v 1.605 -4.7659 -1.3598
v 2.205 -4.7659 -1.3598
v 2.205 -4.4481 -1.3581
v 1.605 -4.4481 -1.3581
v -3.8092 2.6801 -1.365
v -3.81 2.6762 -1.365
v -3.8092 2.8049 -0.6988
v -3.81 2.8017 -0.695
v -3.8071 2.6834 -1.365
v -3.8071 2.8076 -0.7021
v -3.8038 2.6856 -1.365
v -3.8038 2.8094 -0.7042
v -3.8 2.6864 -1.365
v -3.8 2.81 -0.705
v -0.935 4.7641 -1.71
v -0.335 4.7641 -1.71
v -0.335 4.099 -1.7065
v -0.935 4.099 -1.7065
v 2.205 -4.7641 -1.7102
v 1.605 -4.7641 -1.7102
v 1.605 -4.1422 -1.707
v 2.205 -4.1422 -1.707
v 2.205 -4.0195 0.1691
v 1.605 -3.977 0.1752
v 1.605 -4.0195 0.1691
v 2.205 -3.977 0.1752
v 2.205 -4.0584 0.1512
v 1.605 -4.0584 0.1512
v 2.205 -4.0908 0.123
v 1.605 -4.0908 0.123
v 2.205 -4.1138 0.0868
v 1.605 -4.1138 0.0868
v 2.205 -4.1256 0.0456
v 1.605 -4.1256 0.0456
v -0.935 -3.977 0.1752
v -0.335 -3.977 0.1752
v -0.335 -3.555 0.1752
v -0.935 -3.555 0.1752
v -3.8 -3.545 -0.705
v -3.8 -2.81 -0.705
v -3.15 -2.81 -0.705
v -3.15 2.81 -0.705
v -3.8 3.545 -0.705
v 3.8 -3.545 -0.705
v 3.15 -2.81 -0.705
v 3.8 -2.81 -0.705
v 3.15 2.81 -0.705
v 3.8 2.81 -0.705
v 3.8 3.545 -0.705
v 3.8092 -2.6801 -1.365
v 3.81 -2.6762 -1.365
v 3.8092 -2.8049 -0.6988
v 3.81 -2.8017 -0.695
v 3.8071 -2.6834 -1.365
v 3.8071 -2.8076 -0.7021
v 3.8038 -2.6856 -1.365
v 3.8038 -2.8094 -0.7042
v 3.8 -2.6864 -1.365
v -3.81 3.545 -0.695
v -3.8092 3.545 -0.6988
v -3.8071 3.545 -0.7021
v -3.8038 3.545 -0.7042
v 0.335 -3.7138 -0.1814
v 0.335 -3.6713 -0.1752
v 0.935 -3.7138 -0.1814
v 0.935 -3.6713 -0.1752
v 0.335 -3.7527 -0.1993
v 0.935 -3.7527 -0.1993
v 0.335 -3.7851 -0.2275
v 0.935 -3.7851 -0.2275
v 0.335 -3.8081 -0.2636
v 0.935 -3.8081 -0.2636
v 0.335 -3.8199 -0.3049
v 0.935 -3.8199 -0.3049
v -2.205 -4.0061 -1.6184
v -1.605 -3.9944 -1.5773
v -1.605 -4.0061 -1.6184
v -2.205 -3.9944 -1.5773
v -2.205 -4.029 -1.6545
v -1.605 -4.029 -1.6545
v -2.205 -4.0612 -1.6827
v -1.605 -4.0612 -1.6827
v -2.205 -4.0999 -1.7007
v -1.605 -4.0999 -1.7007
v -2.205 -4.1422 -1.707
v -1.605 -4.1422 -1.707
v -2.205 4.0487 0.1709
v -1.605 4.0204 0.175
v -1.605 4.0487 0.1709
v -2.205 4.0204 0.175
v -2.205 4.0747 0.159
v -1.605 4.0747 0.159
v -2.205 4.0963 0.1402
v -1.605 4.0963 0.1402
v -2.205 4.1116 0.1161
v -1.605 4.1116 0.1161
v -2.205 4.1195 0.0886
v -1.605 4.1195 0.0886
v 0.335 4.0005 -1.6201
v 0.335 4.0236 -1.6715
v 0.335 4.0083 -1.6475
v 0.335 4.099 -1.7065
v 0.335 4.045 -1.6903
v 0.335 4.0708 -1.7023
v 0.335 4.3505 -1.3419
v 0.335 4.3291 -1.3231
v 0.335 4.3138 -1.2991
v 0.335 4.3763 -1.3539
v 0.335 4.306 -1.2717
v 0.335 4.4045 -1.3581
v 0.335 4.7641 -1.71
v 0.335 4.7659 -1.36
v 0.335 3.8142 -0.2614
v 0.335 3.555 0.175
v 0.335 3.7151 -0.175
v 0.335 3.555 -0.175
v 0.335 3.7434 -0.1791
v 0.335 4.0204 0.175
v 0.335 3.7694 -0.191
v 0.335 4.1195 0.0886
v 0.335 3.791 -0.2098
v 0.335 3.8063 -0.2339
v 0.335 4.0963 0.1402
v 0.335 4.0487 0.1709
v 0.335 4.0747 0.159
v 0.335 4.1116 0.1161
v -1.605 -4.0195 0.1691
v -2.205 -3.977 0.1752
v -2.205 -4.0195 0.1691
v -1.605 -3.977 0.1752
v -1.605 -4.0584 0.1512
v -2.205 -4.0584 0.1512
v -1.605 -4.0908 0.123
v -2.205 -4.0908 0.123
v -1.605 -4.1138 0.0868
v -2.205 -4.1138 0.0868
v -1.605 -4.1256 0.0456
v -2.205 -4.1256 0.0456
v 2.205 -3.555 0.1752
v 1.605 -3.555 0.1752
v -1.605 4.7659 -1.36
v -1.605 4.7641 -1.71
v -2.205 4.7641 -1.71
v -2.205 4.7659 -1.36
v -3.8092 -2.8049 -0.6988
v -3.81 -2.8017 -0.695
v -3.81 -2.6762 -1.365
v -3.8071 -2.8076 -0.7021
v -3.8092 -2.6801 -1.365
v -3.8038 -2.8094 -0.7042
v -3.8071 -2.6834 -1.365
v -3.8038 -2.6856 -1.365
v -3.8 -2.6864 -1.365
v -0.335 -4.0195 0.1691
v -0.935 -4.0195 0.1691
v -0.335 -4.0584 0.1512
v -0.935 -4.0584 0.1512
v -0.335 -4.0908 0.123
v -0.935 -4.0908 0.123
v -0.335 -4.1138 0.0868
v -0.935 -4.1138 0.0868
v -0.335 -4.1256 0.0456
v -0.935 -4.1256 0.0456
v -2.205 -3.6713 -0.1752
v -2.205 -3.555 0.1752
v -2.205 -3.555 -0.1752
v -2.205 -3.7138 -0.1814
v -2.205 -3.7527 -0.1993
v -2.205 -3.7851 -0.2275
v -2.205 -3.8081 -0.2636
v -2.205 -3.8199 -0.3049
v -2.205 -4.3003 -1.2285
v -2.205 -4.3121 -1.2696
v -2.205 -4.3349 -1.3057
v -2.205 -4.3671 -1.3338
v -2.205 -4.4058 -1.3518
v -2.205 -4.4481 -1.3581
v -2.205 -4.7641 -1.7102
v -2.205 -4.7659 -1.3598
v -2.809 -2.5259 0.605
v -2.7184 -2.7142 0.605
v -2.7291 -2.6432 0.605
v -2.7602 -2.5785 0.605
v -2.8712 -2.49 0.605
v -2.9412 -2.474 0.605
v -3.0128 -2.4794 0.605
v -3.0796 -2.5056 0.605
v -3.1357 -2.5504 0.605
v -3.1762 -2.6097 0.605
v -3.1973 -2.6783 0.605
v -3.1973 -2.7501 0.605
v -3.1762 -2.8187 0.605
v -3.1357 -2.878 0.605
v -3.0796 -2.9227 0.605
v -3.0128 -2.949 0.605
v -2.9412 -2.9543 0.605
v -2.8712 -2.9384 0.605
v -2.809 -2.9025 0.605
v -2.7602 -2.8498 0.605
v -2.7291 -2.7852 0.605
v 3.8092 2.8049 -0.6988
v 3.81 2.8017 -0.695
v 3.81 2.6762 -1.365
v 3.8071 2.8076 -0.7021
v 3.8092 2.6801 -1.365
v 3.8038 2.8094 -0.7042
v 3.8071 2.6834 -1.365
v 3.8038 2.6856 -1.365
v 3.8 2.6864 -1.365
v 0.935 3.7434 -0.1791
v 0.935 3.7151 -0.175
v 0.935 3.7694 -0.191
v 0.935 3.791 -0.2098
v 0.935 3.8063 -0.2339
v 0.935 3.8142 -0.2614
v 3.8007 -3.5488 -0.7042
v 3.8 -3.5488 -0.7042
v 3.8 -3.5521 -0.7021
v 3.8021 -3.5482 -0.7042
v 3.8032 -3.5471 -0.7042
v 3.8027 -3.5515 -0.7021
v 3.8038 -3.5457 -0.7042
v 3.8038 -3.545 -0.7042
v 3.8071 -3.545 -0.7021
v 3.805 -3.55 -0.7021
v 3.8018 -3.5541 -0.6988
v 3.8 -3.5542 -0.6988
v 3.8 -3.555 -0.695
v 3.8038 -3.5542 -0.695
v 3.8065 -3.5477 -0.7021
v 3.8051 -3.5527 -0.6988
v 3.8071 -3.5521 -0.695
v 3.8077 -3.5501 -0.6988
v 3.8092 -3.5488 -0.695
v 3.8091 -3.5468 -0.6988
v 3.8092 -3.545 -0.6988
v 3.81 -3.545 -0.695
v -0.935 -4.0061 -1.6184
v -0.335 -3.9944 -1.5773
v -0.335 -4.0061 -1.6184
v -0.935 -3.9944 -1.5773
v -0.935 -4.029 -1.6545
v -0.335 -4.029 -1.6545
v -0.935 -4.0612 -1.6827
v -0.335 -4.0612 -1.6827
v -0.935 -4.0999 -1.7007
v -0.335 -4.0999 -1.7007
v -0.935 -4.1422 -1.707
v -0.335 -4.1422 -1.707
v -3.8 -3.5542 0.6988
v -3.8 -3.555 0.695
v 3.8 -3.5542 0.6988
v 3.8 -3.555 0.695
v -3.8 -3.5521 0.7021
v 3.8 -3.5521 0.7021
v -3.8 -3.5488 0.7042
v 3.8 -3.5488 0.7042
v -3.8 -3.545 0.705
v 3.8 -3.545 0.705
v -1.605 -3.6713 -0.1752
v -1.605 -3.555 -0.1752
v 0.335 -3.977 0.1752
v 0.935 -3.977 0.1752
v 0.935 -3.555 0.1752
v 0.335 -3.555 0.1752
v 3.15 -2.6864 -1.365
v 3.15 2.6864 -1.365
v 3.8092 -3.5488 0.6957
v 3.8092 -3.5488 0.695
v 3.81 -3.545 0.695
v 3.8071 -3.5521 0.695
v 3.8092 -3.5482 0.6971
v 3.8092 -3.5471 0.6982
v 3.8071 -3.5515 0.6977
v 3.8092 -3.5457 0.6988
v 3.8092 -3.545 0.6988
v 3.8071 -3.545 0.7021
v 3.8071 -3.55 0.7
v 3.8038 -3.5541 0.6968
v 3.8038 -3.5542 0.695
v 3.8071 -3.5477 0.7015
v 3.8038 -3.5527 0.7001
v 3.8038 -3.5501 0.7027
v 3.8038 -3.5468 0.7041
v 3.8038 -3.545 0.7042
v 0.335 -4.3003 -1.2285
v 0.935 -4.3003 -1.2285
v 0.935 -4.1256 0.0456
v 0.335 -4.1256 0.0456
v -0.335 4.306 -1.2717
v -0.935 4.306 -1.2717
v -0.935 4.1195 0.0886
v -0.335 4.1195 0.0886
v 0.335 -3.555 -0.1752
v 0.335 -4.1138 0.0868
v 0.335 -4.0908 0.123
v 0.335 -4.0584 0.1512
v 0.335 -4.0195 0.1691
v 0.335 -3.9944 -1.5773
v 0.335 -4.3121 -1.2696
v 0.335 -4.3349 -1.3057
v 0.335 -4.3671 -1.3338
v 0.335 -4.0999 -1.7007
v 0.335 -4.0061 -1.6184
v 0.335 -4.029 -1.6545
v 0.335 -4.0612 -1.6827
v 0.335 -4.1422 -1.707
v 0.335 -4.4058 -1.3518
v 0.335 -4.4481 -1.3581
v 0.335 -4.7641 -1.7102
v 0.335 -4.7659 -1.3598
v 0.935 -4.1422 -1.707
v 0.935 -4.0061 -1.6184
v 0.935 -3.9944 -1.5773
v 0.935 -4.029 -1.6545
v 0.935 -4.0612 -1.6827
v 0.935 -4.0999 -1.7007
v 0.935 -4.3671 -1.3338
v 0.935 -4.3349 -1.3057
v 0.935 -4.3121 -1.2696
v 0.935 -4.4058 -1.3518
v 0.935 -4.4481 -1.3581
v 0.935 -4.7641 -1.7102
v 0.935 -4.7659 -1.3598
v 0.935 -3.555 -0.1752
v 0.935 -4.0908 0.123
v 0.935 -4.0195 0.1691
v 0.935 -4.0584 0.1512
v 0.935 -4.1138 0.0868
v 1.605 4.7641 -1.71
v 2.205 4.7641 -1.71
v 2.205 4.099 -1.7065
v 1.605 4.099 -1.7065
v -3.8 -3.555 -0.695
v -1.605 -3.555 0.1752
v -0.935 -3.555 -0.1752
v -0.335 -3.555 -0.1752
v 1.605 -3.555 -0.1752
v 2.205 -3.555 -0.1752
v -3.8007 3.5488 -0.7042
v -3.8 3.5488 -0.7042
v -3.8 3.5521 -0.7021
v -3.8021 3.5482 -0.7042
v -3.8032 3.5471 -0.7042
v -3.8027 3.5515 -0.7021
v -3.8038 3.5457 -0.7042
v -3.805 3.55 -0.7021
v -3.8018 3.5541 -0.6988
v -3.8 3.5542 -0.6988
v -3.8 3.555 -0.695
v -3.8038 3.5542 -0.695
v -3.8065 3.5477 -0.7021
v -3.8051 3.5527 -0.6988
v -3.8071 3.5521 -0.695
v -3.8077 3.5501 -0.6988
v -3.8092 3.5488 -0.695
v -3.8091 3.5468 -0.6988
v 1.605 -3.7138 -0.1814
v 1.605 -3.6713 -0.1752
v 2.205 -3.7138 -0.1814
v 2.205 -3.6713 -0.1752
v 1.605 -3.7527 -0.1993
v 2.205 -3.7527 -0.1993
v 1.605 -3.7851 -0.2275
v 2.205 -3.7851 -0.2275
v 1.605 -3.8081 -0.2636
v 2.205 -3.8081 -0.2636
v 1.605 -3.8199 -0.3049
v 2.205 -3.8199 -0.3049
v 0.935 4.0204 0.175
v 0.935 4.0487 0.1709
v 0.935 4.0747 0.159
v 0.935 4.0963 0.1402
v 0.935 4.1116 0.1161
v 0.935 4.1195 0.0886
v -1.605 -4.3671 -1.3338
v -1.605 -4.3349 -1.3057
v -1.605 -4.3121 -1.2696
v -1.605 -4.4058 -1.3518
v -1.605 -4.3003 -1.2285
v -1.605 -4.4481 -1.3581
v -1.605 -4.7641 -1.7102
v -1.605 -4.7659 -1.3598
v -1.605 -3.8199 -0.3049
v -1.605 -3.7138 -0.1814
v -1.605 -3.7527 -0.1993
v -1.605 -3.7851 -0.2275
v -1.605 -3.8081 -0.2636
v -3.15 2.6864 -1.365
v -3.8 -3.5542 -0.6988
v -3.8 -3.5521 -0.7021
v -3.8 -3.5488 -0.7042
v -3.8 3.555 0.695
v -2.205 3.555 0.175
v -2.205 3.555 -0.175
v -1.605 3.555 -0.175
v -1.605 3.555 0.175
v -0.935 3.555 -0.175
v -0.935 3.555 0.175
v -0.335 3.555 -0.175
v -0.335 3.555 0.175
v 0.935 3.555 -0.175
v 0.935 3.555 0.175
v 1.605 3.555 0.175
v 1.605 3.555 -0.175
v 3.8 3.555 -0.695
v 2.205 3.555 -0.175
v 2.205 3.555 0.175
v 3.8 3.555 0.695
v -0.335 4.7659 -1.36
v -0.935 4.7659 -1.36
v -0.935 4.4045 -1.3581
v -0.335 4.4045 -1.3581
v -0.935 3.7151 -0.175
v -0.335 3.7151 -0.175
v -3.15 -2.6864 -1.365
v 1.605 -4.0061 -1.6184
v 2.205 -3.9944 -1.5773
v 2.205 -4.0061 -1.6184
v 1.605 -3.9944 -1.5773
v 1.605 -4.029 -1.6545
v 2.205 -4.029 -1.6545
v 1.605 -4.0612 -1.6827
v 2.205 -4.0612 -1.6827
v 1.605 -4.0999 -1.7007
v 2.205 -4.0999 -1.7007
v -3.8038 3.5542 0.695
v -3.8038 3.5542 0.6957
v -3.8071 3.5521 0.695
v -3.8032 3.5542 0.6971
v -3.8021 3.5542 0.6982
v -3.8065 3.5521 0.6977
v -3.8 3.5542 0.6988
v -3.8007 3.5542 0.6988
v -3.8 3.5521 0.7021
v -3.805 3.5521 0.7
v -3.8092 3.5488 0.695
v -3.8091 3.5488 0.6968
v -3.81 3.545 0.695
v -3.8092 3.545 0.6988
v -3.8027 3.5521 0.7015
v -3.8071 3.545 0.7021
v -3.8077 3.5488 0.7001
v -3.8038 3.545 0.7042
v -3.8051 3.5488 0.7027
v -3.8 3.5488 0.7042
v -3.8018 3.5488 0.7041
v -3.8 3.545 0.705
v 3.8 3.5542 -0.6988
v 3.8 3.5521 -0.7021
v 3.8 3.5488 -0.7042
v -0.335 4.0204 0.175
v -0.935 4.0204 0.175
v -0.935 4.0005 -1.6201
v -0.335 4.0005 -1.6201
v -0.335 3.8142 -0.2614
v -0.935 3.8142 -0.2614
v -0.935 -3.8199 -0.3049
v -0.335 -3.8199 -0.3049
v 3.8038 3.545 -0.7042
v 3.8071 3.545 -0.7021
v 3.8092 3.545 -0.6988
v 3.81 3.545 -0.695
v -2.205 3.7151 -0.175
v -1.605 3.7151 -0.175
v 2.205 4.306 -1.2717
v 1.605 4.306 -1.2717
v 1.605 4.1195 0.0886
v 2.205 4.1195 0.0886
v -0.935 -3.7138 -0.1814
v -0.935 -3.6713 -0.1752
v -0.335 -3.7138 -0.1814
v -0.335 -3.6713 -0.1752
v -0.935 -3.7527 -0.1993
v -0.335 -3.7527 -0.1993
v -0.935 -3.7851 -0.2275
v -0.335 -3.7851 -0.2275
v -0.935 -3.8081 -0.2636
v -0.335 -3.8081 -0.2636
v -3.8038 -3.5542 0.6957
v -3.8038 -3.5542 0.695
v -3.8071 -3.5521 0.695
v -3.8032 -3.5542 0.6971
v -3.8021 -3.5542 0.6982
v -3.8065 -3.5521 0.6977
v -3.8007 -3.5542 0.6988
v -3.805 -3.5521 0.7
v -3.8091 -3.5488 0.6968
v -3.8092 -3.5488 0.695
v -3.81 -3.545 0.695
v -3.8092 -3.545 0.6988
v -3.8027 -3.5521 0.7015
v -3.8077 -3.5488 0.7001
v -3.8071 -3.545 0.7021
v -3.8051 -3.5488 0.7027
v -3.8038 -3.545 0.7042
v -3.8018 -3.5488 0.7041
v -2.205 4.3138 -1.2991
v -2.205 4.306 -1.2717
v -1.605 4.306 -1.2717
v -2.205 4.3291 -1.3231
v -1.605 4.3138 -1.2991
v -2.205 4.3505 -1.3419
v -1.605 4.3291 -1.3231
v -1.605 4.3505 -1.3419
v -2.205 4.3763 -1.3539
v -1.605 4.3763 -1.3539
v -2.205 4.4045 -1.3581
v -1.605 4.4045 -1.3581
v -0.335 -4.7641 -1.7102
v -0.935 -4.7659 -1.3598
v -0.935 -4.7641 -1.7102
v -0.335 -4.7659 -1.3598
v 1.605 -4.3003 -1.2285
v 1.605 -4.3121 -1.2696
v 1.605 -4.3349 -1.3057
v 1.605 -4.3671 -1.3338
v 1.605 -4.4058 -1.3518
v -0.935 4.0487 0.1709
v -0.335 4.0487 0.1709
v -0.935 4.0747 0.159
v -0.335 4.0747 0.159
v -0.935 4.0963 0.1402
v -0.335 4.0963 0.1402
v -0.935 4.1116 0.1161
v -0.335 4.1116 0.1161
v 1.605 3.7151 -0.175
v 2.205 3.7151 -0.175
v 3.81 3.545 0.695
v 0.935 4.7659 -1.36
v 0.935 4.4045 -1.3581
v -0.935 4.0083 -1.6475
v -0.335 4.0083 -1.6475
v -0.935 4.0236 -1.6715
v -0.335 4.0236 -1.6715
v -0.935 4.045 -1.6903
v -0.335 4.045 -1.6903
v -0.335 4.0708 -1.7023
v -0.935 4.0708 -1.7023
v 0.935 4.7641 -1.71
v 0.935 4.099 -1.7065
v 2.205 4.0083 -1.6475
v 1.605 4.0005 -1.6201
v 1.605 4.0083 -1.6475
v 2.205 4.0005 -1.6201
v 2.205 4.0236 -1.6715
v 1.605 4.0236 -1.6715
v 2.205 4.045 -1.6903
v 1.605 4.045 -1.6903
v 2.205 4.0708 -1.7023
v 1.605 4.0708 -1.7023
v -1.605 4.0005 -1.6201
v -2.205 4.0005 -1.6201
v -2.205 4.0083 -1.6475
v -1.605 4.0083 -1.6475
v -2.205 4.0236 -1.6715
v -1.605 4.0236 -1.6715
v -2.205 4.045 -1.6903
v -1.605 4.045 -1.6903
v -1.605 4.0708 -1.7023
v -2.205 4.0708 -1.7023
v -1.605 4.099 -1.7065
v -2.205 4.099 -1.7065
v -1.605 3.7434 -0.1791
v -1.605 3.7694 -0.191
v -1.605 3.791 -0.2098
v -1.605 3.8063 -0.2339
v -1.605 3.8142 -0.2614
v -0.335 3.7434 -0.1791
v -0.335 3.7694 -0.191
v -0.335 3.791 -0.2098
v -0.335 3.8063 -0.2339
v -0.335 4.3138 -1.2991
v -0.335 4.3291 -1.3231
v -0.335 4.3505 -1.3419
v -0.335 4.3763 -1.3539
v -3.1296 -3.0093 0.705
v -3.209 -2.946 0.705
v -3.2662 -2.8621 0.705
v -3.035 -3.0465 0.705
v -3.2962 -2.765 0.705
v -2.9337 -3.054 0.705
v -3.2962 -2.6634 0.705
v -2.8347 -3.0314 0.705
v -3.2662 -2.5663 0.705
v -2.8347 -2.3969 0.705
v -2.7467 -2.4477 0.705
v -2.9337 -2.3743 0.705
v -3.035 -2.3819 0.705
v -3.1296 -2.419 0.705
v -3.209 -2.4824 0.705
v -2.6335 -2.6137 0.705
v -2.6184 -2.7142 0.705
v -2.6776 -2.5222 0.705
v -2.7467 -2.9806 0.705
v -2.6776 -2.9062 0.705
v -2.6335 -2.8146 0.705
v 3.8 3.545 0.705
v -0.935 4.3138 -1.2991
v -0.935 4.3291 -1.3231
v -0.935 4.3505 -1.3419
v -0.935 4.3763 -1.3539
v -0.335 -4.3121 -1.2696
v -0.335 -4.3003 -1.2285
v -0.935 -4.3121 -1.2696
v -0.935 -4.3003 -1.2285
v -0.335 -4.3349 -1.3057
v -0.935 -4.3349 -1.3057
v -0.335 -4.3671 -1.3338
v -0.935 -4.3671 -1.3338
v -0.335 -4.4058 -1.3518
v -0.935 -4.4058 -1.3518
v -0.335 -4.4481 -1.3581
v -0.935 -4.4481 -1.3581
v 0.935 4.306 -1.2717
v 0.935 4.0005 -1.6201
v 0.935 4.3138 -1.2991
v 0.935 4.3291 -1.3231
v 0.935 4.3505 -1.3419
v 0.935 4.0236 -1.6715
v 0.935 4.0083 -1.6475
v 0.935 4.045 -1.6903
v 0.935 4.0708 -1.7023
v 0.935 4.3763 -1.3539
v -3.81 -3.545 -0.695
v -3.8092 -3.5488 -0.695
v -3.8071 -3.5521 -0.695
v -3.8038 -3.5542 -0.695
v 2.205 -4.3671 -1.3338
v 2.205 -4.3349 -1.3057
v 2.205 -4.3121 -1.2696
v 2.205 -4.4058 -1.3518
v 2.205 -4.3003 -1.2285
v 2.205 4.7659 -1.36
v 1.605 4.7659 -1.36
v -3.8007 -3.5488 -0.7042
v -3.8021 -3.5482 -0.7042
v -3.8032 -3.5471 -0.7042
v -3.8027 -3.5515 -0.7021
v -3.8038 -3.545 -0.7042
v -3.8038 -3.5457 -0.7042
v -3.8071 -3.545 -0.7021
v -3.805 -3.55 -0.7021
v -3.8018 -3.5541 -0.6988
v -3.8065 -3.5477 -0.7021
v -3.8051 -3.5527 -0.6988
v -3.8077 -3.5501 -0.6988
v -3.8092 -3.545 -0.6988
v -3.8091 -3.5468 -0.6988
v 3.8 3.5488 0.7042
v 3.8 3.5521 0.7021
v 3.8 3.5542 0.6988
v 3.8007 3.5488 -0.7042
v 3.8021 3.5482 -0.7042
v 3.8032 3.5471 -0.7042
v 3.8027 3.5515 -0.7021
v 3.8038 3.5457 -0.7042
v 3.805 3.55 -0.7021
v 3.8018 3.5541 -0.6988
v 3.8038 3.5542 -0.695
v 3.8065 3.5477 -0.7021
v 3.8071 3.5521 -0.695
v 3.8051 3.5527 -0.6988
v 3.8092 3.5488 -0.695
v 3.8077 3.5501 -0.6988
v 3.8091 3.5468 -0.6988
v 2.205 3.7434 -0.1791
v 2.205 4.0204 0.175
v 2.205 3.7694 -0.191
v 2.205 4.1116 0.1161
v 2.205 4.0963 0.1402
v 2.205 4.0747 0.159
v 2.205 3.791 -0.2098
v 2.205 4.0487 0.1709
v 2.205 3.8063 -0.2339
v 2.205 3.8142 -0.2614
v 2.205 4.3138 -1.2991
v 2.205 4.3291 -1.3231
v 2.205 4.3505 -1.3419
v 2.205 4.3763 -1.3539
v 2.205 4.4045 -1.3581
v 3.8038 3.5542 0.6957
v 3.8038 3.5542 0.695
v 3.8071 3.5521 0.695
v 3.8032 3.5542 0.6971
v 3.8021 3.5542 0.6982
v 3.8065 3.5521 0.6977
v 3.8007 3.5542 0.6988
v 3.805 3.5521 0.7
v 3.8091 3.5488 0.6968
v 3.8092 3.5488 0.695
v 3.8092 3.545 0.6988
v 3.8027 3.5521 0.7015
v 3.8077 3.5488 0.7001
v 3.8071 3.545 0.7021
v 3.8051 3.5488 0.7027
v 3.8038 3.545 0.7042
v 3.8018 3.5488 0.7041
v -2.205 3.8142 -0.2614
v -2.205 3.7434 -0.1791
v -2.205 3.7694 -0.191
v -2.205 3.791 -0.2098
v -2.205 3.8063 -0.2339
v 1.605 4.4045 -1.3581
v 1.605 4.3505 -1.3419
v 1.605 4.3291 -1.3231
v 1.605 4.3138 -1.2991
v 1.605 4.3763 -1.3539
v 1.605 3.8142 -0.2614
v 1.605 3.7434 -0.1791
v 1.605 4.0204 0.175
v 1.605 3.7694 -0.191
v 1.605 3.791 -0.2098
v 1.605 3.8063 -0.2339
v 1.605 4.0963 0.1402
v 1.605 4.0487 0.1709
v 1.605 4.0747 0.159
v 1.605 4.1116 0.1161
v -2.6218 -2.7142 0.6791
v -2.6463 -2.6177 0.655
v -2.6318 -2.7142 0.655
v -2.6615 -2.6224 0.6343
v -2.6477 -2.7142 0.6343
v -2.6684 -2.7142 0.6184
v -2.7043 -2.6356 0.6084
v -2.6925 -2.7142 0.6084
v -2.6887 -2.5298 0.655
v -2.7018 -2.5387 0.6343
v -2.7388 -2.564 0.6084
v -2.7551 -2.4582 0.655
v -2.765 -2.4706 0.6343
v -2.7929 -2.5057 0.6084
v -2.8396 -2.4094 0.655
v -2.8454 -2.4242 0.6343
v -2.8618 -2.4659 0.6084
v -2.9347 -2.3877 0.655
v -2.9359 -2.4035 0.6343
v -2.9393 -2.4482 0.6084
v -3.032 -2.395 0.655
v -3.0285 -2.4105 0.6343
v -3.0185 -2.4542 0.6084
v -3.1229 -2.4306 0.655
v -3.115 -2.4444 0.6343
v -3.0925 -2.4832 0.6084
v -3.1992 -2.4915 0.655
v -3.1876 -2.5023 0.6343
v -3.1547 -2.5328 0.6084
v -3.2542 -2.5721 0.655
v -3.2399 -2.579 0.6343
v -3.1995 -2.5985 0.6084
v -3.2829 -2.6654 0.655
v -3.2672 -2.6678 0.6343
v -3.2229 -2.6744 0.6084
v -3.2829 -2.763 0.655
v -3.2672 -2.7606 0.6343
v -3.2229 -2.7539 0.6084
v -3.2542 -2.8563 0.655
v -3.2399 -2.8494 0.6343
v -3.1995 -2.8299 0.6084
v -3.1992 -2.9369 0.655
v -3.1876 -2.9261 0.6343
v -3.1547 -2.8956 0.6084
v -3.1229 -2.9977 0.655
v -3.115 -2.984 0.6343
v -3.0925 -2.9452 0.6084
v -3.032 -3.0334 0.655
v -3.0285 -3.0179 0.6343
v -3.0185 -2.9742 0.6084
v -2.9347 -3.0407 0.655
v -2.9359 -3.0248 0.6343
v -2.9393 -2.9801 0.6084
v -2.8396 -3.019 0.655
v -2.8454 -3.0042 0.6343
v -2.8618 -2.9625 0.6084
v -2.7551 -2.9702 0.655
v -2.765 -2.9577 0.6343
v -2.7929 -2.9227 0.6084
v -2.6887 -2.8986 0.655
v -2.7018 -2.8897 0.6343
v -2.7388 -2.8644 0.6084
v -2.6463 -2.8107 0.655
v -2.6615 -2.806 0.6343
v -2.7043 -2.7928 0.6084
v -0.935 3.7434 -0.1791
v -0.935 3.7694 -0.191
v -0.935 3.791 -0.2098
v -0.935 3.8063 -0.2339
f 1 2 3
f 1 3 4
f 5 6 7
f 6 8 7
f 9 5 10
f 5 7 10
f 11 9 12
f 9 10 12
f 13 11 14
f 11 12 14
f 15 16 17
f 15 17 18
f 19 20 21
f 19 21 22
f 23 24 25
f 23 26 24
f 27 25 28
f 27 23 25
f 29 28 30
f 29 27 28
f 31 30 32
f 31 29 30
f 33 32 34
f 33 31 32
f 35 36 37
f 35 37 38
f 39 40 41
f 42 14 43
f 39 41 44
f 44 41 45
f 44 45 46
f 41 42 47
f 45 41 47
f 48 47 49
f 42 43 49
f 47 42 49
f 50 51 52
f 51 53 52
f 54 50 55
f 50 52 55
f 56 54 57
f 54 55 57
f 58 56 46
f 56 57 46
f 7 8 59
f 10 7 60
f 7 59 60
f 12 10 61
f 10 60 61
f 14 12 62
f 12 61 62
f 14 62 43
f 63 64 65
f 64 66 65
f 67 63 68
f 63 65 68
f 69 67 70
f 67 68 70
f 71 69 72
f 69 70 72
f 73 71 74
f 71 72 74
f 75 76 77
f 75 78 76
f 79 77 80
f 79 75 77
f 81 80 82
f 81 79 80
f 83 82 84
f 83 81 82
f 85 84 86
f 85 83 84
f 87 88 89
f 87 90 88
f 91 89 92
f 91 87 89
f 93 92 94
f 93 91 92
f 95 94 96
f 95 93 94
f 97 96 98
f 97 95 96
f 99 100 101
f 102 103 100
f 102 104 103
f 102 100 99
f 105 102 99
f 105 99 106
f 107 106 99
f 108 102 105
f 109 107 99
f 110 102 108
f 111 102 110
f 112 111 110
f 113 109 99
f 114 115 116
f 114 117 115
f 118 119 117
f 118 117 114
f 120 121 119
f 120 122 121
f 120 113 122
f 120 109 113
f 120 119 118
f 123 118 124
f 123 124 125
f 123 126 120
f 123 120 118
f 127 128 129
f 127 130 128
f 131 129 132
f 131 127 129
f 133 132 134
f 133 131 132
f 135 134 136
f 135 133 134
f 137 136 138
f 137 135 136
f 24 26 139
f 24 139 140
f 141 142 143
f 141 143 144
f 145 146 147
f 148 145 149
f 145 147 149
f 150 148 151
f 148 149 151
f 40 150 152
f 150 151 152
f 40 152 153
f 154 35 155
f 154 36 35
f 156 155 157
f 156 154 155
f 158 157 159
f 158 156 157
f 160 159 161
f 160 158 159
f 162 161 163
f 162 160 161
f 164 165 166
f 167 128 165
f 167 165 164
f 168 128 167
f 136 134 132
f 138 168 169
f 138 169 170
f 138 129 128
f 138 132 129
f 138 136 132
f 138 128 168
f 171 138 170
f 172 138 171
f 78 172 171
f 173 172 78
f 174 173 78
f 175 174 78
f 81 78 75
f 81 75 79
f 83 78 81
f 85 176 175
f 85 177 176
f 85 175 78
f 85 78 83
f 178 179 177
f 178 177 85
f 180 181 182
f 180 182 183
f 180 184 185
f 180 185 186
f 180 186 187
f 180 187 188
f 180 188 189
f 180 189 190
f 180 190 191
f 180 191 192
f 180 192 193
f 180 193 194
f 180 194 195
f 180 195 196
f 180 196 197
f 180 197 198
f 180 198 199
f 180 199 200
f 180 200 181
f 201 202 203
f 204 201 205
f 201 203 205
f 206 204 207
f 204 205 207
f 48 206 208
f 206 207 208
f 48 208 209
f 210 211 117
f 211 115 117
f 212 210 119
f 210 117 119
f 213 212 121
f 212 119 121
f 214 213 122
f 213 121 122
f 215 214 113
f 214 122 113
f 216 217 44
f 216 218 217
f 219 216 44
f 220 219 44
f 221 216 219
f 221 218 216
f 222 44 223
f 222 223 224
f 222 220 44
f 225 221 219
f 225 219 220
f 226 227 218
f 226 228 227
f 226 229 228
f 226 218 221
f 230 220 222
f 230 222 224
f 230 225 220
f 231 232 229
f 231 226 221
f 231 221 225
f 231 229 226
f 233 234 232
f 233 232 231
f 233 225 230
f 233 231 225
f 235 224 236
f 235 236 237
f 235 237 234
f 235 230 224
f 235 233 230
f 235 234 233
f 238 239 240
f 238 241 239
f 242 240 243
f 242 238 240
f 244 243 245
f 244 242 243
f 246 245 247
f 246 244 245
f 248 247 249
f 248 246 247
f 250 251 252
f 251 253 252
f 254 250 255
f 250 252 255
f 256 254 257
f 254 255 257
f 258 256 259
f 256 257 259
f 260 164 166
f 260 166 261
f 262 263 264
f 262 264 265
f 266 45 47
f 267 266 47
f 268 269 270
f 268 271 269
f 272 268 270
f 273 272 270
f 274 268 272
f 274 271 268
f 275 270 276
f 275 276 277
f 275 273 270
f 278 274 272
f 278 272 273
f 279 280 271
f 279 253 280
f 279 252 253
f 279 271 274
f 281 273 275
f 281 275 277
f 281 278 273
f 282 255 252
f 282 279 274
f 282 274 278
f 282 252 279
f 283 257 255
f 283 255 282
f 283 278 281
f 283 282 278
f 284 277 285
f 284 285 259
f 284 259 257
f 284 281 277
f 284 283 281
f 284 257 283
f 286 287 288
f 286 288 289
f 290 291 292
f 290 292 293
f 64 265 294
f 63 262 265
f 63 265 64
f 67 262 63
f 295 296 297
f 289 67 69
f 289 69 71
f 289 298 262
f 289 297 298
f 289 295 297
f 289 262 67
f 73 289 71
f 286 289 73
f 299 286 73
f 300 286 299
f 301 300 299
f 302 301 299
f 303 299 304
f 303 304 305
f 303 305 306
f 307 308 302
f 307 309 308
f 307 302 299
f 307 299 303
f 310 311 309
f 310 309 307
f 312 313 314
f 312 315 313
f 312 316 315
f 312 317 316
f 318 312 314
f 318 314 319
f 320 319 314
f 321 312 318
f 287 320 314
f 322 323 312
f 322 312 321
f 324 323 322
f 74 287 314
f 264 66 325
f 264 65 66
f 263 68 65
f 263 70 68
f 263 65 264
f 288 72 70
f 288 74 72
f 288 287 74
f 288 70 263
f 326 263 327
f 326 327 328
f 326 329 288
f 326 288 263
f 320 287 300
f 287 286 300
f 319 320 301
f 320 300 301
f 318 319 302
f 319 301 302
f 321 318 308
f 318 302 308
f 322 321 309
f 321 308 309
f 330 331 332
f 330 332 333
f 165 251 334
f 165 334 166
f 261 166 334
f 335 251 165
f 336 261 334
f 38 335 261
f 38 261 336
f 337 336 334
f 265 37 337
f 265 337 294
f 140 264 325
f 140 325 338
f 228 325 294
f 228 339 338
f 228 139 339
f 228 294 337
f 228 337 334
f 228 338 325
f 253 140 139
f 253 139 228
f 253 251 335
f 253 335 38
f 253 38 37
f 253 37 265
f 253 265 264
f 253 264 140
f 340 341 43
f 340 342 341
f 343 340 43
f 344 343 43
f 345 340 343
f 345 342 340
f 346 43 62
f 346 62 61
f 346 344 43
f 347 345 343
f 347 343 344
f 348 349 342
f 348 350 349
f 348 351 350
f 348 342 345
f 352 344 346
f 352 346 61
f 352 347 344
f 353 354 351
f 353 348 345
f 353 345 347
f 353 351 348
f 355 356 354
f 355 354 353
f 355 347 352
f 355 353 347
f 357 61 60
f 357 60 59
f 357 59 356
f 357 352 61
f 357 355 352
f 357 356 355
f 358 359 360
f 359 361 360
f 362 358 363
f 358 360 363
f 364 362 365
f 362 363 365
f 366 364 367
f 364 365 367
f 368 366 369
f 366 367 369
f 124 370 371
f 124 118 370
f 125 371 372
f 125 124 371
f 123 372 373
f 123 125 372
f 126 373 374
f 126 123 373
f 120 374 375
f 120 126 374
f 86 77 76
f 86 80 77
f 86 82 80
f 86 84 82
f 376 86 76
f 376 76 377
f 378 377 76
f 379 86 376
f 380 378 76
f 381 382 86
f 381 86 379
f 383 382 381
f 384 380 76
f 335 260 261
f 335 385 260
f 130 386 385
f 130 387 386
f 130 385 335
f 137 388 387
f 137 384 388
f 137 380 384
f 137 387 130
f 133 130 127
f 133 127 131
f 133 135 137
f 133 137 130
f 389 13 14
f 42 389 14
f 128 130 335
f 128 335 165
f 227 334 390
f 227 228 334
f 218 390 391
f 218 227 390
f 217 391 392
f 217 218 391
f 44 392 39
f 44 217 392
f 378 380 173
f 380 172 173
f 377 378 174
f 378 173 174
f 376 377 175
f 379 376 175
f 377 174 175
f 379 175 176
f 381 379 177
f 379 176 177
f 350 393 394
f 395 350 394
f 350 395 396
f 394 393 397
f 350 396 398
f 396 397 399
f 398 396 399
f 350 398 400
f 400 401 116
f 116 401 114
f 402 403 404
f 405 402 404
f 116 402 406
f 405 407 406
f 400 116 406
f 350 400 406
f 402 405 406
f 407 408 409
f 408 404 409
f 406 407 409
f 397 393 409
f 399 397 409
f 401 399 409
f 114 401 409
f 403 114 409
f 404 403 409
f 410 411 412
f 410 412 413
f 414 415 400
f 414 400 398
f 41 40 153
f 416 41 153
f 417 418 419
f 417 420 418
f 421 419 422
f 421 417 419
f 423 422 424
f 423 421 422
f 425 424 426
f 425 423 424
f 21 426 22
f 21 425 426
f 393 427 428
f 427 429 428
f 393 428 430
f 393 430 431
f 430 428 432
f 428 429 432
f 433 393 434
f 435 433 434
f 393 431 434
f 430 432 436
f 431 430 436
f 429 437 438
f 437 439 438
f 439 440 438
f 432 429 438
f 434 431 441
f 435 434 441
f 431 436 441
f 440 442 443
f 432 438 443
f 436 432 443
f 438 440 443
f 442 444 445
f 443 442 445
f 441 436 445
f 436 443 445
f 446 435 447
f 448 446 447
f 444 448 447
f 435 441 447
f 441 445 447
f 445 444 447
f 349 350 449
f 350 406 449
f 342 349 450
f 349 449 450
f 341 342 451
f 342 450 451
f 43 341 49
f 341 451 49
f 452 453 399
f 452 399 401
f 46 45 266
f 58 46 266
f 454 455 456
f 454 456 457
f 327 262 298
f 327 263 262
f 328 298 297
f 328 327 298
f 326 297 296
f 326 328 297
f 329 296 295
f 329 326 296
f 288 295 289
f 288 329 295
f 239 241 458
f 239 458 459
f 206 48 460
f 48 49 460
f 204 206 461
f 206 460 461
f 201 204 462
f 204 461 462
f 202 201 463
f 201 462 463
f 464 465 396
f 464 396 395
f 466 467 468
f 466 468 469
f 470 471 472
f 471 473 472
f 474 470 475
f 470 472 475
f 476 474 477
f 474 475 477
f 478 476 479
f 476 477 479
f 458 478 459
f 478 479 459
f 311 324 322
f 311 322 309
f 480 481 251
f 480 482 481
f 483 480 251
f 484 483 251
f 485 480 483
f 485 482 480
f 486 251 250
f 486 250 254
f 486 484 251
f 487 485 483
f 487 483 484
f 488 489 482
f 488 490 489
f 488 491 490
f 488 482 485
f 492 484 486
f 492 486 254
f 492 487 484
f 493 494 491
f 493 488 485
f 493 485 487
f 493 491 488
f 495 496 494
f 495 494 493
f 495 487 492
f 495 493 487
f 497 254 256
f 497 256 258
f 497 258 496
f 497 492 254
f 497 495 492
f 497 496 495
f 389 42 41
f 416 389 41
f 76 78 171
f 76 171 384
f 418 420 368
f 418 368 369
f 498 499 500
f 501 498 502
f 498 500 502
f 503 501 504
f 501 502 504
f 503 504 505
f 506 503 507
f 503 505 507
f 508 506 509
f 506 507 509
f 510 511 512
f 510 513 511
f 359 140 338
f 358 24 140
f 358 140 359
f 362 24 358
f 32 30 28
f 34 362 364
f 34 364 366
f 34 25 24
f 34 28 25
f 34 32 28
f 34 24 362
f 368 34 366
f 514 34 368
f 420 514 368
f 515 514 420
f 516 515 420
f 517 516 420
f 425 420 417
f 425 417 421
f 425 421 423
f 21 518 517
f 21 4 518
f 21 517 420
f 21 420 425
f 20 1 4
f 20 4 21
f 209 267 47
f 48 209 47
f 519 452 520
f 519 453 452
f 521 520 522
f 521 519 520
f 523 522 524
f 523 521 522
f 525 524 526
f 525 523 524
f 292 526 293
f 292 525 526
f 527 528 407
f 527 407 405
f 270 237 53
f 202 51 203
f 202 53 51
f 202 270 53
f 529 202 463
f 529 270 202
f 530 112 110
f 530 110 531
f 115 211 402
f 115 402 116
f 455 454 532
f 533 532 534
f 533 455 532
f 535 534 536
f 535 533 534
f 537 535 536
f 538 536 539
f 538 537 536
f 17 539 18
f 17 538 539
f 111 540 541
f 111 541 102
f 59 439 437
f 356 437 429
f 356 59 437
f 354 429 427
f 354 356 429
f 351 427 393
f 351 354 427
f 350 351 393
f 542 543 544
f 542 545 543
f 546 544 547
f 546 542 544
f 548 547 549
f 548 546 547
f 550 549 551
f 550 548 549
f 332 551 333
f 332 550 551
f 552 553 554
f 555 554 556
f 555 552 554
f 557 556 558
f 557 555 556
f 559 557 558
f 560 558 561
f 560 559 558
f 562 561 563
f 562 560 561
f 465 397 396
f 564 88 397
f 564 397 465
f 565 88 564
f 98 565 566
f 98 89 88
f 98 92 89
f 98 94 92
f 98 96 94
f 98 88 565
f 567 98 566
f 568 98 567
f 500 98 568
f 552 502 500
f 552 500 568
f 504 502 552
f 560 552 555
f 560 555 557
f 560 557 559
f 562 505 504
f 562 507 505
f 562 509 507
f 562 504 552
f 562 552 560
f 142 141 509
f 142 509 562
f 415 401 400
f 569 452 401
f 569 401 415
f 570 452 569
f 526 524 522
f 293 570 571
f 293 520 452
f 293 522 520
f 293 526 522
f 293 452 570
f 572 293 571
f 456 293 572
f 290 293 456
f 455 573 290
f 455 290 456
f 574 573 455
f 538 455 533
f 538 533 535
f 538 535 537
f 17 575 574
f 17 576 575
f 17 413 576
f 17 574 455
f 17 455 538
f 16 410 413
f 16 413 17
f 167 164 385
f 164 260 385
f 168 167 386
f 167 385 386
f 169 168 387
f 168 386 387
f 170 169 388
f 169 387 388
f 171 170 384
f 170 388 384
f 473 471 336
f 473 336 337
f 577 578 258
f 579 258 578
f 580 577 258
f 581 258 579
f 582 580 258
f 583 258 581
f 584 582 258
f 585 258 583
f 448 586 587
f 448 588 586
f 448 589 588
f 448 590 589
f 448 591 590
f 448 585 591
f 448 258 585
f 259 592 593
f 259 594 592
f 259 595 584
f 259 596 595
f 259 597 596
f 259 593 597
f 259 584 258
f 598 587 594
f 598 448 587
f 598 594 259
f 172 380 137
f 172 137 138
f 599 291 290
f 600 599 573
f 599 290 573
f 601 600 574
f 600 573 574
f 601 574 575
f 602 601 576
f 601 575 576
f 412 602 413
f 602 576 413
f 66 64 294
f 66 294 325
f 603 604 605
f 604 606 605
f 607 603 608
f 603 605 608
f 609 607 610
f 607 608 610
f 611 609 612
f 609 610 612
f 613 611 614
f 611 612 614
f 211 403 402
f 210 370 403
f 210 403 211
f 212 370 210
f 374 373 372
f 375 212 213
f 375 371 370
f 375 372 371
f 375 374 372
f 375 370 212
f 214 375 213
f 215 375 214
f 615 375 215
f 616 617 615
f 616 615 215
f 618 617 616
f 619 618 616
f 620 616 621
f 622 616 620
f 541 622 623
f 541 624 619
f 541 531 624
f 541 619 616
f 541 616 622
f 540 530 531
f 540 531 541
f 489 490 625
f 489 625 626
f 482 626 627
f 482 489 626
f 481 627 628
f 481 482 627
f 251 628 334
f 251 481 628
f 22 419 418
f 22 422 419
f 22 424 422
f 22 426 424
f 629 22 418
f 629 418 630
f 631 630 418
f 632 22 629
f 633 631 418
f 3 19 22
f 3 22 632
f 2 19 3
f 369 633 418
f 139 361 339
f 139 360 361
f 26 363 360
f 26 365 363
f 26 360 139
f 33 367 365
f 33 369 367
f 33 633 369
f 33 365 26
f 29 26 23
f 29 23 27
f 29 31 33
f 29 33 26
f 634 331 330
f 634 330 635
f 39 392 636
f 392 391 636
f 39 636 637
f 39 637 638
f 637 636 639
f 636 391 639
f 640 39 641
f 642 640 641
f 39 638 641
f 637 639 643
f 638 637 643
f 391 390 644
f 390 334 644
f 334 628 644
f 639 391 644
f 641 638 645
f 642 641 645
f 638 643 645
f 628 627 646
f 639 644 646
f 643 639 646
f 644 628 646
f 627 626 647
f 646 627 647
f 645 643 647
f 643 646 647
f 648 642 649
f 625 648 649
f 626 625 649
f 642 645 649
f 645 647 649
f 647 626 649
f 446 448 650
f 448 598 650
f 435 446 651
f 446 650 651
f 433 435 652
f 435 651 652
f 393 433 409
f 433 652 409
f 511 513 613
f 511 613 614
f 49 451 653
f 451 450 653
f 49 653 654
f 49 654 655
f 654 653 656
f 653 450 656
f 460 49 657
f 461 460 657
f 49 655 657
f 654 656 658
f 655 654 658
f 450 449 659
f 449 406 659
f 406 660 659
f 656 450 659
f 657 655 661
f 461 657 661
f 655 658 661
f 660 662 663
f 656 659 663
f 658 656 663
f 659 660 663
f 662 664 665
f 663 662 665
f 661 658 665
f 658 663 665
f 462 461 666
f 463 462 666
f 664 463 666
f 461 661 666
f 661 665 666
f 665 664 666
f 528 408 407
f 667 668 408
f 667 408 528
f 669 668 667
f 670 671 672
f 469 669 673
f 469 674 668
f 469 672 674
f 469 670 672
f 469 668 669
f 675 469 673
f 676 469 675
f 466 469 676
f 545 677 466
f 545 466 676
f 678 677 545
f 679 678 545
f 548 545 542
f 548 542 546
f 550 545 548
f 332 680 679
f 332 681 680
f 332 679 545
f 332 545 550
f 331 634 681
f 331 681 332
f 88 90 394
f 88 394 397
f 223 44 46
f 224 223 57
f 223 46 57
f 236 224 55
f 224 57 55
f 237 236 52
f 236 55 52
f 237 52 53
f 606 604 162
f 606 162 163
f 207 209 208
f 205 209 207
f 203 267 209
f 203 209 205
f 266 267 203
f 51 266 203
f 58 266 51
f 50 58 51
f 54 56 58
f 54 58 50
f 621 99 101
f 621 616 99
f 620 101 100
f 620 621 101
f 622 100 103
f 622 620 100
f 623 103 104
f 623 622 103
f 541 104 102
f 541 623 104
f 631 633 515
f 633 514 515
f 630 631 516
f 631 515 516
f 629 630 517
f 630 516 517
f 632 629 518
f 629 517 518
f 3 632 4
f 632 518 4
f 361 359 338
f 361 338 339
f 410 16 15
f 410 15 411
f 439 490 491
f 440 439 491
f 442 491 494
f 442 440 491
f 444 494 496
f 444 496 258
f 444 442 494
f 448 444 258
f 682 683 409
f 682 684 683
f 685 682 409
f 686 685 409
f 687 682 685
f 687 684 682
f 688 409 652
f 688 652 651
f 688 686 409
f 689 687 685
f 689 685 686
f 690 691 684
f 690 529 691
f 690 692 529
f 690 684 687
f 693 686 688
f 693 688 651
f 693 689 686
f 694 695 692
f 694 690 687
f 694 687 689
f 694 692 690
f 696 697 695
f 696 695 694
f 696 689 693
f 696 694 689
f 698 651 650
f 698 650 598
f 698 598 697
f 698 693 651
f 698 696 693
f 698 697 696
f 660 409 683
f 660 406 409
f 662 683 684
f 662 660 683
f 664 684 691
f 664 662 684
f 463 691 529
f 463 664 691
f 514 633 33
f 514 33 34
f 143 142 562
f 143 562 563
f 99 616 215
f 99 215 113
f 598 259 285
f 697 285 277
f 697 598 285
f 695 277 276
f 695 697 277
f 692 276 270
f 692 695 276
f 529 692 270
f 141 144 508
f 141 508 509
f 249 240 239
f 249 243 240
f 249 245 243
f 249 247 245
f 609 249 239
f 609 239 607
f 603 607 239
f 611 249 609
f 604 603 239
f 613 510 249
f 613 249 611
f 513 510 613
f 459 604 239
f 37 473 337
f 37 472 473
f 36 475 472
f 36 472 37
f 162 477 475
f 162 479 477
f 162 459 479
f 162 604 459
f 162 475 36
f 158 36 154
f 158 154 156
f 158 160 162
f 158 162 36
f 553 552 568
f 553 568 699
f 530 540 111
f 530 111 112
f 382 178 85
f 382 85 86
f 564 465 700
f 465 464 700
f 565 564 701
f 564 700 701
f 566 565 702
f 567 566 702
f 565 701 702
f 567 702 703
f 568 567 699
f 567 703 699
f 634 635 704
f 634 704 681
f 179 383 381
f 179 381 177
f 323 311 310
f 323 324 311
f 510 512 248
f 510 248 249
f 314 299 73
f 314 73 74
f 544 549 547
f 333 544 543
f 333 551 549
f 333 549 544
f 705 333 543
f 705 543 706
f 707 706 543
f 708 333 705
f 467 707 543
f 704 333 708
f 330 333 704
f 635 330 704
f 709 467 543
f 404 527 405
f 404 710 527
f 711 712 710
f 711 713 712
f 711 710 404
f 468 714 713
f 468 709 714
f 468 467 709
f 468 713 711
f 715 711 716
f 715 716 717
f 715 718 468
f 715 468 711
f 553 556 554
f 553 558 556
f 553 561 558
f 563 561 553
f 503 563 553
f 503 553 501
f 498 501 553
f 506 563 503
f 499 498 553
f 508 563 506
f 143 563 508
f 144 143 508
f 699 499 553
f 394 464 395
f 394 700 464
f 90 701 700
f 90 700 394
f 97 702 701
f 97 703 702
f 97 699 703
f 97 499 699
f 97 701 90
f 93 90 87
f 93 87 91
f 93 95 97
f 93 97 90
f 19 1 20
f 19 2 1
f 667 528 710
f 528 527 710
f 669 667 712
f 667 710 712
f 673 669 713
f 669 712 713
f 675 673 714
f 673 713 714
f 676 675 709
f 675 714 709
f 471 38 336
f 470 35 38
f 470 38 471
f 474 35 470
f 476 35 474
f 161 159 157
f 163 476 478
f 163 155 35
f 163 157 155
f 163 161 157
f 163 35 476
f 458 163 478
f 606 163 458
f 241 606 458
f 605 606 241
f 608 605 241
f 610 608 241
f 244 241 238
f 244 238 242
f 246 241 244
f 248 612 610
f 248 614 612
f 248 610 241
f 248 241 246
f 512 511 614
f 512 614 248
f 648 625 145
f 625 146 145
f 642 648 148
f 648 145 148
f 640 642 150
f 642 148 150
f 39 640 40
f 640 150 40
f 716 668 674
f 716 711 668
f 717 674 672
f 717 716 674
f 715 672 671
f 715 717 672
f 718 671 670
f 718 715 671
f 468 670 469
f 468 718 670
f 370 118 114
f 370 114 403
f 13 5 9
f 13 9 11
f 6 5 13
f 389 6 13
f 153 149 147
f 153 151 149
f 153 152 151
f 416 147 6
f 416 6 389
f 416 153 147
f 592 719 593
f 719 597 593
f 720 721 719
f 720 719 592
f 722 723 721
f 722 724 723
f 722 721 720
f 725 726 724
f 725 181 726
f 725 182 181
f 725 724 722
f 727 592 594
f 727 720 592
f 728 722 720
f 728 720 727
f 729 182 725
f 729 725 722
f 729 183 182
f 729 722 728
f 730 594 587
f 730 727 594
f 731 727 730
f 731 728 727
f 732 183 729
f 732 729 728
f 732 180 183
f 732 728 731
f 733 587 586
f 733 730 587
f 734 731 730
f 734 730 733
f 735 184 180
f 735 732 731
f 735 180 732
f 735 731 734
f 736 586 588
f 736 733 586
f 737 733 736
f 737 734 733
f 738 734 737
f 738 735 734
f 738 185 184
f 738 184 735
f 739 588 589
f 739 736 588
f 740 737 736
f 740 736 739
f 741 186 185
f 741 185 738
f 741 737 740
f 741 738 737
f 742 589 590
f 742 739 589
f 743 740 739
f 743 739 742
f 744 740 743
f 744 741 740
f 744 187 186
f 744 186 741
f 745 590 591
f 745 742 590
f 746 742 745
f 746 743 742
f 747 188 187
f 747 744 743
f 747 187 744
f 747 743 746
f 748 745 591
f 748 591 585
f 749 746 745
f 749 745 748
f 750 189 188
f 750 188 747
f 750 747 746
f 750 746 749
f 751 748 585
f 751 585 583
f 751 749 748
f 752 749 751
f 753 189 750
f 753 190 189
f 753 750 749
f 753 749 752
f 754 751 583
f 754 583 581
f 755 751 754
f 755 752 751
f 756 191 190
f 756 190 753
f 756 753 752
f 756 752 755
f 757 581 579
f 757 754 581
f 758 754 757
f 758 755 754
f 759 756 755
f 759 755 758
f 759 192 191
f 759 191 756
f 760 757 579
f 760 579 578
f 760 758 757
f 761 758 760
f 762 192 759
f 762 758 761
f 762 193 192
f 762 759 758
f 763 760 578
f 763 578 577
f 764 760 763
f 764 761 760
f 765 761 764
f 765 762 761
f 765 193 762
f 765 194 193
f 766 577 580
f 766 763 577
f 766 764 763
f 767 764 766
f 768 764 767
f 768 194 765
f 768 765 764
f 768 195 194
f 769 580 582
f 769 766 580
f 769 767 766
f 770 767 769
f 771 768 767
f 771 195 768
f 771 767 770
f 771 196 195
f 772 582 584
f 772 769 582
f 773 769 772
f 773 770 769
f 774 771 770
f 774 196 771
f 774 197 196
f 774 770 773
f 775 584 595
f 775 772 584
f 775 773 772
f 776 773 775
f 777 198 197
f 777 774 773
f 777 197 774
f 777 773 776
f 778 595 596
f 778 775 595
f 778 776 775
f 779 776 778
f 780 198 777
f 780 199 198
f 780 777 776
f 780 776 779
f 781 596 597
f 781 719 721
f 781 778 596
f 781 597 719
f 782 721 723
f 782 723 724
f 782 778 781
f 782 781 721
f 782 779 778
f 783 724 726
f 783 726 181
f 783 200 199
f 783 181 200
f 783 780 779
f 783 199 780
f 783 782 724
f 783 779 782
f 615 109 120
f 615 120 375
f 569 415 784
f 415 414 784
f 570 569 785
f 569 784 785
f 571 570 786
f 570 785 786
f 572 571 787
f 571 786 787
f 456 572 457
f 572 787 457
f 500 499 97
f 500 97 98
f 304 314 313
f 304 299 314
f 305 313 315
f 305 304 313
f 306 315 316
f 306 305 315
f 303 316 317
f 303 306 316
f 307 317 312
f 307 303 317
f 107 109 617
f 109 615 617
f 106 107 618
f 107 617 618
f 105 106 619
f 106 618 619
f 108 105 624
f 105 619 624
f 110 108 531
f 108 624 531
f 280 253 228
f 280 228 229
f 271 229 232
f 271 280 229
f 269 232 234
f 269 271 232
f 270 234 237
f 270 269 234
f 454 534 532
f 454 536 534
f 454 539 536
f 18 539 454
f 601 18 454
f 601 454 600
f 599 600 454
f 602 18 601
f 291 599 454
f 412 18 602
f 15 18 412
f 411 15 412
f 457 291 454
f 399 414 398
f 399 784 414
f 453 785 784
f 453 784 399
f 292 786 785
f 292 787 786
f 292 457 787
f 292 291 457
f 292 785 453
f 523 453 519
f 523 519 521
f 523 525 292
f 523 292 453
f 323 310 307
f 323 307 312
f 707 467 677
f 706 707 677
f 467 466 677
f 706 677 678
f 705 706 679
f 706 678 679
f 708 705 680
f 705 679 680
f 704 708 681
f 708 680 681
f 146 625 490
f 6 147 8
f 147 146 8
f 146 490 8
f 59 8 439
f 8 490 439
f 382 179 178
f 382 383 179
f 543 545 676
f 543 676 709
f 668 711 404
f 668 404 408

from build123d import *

# Parameters (mm, degrees)
F0_W     = 7.62
F0_H     = 7.11
F1_DEPTH = 0.705
F3_DEPTH = 0.66
F5_DEPTH = 25
F6_R     = 0.01
F7_R     = 0.3408088795
F8_DEPTH = 0.1
F9_R     = 0.09999
F11_W    = 0.6
F11_H    = 0.35
F13_R    = 0.1
F14_W    = 0.6
F14_H    = 0.3504652178
F16_R    = 0.15


# Not quite as in the source:
# - a fillet or chamfer is up to 0.001 mm smaller than in the source, because OpenCascade refuses the exact size
# - a feature names something its author has since deleted; it is built from what else it names


with BuildPart() as f1:
    # F0 (on Top) → F1 (new body, symmetric)
    with BuildSketch(Plane.XY):
        Rectangle(F0_W, F0_H)
    extrude(amount=F1_DEPTH, both=True)

    # F2 (on face) → F3 (join)
    with BuildSketch(Plane(origin=(0, 0, -0.705), x_dir=(1, 0, 0), z_dir=(0, 0, -1))):
        Polygon((-3.81, 2.81), (-3.81, 0), (-3.81, -2.81), (-3.15, -2.81), (-3.15, 2.81), align=None)
        Polygon((3.81, 0), (3.81, 2.81), (3.15, 2.81), (3.15, -2.81), (3.81, -2.81), align=None)
    extrude(amount=F3_DEPTH)

    # F4 (on face) → F5 (cut)
    with BuildSketch(Plane(origin=(-3.81, 0, 0), x_dir=(0, -1, 0), z_dir=(-1, 0, 0))):
        Polygon((-2.81, -1.365), (-2.6863825042, -1.365), (-2.81, -0.705), align=None)
        Polygon((2.81, -1.365), (2.81, -0.705), (2.6863825042, -1.365), align=None)
    extrude(amount=-F5_DEPTH, mode=Mode.SUBTRACT)

    # F6
    f6_edges = [f1.edges().sort_by_distance(p)[0] for p in [
        (-3.81, 0, 0.705),
        (-3.81, -3.555, 0),
        (0, -3.555, 0.705),
        (-3.81, 3.555, 0),
        (3.81, -3.555, 0),
        (3.81, 0, 0.705),
        (3.81, 3.555, 0),
        (0, 3.555, 0.705),
        (0, 3.555, -0.705),
        (0, -3.555, -0.705),
        (3.81, -3.1825, -0.705),
        (3.81, -2.748191, -1.035),
        (3.81, 2.748191, -1.035),
        (3.81, 3.1825, -0.705),
        (-3.81, -2.748191, -1.035),
        (-3.81, -3.1825, -0.705),
        (-3.81, 3.1825, -0.705),
        (-3.81, 2.748191, -1.035),
    ]]
    fillet(f6_edges, radius=F6_R)

    # F7 (on face) → F8 (cut)
    with BuildSketch(Plane.XY.offset(0.705)):
        with Locations((-2.9591911205, -2.7141911205)):
            Circle(F7_R)
    extrude(amount=-F8_DEPTH, mode=Mode.SUBTRACT)

    # F9 (radius 0.1 in the source; OpenCascade refuses exactly that, so slightly less here)
    f9_edges = [f1.edges().sort_by_distance(p)[0] for p in [
        (-3.3, -2.714191, 0.605),
    ]]
    fillet(f9_edges, radius=F9_R)

    # F12: sweep along a path in F10
    with BuildLine(Plane.YZ) as f12_path:
        Line((3.555, 0), (3.955, 0))
        Line((3.955, 0), (4.165, -1.5318583786))
        Line((4.165, -1.5318583786), (4.765, -1.535))
    # F11 (on face) → F12 (sweep)
    with BuildSketch(Plane(origin=(0, 3.555, 0), x_dir=(-1, 0, 0), z_dir=(0, 1, 0))):
        with Locations((-1.905, 0)):
            Rectangle(F11_W, F11_H)
        with Locations((-0.635, 0)):
            Rectangle(F11_W, F11_H)
        with Locations((0.635, 0)):
            Rectangle(F11_W, F11_H)
        with Locations((1.905, 0)):
            Rectangle(F11_W, F11_H)
    sweep(path=f12_path.line, transition=Transition.RIGHT)

    # F13
    f13_edges = [f1.edges().sort_by_distance(p)[0] for p in [
        (-1.905, 4.107646, 0.175),
        (-1.905, 4.317756, -1.357656),
        (-0.635, 4.107646, 0.175),
        (-0.635, 4.317756, -1.357656),
        (0.635, 4.107646, 0.175),
        (0.635, 4.317756, -1.357656),
        (1.905, 4.107646, 0.175),
        (1.905, 4.317756, -1.357656),
        (1.905, 3.802354, -0.175),
        (0.635, 3.802354, -0.175),
        (-0.635, 3.802354, -0.175),
        (-1.905, 3.802354, -0.175),
        (-1.905, 4.012244, -1.706061),
        (-0.635, 4.012244, -1.706061),
        (0.635, 4.012244, -1.706061),
        (1.905, 4.012244, -1.706061),
    ]]
    fillet(f13_edges, radius=F13_R)

    # F15: sweep along a path in F10
    with BuildLine(Plane.YZ) as f15_path:
        Line((-3.555, 0), (-3.955, 0))
        Line((-3.955, 0), (-4.165, -1.5318583786))
        Line((-4.165, -1.5318583786), (-4.765, -1.535))
    # F14 (on face) → F15 (sweep)
    with BuildSketch(Plane.XZ.offset(3.555)):
        with Locations((-1.905, 0)):
            Rectangle(F14_W, F14_H)
        with Locations((-0.635, 0)):
            Rectangle(F14_W, F14_H)
        with Locations((0.635, 0)):
            Rectangle(F14_W, F14_H)
        with Locations((1.905, 0)):
            Rectangle(F14_W, F14_H)
    sweep(path=f15_path.line, transition=Transition.RIGHT)

    # F16
    f16_edges = [f1.edges().sort_by_distance(p)[0] for p in [
        (-1.905, -4.107849, 0.175233),
        (-0.635, -4.107849, 0.175233),
        (0.635, -4.107849, 0.175233),
        (1.905, -4.107849, 0.175233),
        (-1.905, -4.317959, -1.357424),
        (-0.635, -4.317959, -1.357424),
        (0.635, -4.317959, -1.357424),
        (1.905, -4.317959, -1.357424),
        (-1.905, -3.802151, -0.175233),
        (-0.635, -3.802151, -0.175233),
        (0.635, -3.802151, -0.175233),
        (1.905, -3.802151, -0.175233),
        (0.635, -4.012041, -1.706292),
        (-0.635, -4.012041, -1.706292),
        (-1.905, -4.012041, -1.706292),
        (1.905, -4.012041, -1.706292),
    ]]
    fillet(f16_edges, radius=F16_R)


solid = f1.part
